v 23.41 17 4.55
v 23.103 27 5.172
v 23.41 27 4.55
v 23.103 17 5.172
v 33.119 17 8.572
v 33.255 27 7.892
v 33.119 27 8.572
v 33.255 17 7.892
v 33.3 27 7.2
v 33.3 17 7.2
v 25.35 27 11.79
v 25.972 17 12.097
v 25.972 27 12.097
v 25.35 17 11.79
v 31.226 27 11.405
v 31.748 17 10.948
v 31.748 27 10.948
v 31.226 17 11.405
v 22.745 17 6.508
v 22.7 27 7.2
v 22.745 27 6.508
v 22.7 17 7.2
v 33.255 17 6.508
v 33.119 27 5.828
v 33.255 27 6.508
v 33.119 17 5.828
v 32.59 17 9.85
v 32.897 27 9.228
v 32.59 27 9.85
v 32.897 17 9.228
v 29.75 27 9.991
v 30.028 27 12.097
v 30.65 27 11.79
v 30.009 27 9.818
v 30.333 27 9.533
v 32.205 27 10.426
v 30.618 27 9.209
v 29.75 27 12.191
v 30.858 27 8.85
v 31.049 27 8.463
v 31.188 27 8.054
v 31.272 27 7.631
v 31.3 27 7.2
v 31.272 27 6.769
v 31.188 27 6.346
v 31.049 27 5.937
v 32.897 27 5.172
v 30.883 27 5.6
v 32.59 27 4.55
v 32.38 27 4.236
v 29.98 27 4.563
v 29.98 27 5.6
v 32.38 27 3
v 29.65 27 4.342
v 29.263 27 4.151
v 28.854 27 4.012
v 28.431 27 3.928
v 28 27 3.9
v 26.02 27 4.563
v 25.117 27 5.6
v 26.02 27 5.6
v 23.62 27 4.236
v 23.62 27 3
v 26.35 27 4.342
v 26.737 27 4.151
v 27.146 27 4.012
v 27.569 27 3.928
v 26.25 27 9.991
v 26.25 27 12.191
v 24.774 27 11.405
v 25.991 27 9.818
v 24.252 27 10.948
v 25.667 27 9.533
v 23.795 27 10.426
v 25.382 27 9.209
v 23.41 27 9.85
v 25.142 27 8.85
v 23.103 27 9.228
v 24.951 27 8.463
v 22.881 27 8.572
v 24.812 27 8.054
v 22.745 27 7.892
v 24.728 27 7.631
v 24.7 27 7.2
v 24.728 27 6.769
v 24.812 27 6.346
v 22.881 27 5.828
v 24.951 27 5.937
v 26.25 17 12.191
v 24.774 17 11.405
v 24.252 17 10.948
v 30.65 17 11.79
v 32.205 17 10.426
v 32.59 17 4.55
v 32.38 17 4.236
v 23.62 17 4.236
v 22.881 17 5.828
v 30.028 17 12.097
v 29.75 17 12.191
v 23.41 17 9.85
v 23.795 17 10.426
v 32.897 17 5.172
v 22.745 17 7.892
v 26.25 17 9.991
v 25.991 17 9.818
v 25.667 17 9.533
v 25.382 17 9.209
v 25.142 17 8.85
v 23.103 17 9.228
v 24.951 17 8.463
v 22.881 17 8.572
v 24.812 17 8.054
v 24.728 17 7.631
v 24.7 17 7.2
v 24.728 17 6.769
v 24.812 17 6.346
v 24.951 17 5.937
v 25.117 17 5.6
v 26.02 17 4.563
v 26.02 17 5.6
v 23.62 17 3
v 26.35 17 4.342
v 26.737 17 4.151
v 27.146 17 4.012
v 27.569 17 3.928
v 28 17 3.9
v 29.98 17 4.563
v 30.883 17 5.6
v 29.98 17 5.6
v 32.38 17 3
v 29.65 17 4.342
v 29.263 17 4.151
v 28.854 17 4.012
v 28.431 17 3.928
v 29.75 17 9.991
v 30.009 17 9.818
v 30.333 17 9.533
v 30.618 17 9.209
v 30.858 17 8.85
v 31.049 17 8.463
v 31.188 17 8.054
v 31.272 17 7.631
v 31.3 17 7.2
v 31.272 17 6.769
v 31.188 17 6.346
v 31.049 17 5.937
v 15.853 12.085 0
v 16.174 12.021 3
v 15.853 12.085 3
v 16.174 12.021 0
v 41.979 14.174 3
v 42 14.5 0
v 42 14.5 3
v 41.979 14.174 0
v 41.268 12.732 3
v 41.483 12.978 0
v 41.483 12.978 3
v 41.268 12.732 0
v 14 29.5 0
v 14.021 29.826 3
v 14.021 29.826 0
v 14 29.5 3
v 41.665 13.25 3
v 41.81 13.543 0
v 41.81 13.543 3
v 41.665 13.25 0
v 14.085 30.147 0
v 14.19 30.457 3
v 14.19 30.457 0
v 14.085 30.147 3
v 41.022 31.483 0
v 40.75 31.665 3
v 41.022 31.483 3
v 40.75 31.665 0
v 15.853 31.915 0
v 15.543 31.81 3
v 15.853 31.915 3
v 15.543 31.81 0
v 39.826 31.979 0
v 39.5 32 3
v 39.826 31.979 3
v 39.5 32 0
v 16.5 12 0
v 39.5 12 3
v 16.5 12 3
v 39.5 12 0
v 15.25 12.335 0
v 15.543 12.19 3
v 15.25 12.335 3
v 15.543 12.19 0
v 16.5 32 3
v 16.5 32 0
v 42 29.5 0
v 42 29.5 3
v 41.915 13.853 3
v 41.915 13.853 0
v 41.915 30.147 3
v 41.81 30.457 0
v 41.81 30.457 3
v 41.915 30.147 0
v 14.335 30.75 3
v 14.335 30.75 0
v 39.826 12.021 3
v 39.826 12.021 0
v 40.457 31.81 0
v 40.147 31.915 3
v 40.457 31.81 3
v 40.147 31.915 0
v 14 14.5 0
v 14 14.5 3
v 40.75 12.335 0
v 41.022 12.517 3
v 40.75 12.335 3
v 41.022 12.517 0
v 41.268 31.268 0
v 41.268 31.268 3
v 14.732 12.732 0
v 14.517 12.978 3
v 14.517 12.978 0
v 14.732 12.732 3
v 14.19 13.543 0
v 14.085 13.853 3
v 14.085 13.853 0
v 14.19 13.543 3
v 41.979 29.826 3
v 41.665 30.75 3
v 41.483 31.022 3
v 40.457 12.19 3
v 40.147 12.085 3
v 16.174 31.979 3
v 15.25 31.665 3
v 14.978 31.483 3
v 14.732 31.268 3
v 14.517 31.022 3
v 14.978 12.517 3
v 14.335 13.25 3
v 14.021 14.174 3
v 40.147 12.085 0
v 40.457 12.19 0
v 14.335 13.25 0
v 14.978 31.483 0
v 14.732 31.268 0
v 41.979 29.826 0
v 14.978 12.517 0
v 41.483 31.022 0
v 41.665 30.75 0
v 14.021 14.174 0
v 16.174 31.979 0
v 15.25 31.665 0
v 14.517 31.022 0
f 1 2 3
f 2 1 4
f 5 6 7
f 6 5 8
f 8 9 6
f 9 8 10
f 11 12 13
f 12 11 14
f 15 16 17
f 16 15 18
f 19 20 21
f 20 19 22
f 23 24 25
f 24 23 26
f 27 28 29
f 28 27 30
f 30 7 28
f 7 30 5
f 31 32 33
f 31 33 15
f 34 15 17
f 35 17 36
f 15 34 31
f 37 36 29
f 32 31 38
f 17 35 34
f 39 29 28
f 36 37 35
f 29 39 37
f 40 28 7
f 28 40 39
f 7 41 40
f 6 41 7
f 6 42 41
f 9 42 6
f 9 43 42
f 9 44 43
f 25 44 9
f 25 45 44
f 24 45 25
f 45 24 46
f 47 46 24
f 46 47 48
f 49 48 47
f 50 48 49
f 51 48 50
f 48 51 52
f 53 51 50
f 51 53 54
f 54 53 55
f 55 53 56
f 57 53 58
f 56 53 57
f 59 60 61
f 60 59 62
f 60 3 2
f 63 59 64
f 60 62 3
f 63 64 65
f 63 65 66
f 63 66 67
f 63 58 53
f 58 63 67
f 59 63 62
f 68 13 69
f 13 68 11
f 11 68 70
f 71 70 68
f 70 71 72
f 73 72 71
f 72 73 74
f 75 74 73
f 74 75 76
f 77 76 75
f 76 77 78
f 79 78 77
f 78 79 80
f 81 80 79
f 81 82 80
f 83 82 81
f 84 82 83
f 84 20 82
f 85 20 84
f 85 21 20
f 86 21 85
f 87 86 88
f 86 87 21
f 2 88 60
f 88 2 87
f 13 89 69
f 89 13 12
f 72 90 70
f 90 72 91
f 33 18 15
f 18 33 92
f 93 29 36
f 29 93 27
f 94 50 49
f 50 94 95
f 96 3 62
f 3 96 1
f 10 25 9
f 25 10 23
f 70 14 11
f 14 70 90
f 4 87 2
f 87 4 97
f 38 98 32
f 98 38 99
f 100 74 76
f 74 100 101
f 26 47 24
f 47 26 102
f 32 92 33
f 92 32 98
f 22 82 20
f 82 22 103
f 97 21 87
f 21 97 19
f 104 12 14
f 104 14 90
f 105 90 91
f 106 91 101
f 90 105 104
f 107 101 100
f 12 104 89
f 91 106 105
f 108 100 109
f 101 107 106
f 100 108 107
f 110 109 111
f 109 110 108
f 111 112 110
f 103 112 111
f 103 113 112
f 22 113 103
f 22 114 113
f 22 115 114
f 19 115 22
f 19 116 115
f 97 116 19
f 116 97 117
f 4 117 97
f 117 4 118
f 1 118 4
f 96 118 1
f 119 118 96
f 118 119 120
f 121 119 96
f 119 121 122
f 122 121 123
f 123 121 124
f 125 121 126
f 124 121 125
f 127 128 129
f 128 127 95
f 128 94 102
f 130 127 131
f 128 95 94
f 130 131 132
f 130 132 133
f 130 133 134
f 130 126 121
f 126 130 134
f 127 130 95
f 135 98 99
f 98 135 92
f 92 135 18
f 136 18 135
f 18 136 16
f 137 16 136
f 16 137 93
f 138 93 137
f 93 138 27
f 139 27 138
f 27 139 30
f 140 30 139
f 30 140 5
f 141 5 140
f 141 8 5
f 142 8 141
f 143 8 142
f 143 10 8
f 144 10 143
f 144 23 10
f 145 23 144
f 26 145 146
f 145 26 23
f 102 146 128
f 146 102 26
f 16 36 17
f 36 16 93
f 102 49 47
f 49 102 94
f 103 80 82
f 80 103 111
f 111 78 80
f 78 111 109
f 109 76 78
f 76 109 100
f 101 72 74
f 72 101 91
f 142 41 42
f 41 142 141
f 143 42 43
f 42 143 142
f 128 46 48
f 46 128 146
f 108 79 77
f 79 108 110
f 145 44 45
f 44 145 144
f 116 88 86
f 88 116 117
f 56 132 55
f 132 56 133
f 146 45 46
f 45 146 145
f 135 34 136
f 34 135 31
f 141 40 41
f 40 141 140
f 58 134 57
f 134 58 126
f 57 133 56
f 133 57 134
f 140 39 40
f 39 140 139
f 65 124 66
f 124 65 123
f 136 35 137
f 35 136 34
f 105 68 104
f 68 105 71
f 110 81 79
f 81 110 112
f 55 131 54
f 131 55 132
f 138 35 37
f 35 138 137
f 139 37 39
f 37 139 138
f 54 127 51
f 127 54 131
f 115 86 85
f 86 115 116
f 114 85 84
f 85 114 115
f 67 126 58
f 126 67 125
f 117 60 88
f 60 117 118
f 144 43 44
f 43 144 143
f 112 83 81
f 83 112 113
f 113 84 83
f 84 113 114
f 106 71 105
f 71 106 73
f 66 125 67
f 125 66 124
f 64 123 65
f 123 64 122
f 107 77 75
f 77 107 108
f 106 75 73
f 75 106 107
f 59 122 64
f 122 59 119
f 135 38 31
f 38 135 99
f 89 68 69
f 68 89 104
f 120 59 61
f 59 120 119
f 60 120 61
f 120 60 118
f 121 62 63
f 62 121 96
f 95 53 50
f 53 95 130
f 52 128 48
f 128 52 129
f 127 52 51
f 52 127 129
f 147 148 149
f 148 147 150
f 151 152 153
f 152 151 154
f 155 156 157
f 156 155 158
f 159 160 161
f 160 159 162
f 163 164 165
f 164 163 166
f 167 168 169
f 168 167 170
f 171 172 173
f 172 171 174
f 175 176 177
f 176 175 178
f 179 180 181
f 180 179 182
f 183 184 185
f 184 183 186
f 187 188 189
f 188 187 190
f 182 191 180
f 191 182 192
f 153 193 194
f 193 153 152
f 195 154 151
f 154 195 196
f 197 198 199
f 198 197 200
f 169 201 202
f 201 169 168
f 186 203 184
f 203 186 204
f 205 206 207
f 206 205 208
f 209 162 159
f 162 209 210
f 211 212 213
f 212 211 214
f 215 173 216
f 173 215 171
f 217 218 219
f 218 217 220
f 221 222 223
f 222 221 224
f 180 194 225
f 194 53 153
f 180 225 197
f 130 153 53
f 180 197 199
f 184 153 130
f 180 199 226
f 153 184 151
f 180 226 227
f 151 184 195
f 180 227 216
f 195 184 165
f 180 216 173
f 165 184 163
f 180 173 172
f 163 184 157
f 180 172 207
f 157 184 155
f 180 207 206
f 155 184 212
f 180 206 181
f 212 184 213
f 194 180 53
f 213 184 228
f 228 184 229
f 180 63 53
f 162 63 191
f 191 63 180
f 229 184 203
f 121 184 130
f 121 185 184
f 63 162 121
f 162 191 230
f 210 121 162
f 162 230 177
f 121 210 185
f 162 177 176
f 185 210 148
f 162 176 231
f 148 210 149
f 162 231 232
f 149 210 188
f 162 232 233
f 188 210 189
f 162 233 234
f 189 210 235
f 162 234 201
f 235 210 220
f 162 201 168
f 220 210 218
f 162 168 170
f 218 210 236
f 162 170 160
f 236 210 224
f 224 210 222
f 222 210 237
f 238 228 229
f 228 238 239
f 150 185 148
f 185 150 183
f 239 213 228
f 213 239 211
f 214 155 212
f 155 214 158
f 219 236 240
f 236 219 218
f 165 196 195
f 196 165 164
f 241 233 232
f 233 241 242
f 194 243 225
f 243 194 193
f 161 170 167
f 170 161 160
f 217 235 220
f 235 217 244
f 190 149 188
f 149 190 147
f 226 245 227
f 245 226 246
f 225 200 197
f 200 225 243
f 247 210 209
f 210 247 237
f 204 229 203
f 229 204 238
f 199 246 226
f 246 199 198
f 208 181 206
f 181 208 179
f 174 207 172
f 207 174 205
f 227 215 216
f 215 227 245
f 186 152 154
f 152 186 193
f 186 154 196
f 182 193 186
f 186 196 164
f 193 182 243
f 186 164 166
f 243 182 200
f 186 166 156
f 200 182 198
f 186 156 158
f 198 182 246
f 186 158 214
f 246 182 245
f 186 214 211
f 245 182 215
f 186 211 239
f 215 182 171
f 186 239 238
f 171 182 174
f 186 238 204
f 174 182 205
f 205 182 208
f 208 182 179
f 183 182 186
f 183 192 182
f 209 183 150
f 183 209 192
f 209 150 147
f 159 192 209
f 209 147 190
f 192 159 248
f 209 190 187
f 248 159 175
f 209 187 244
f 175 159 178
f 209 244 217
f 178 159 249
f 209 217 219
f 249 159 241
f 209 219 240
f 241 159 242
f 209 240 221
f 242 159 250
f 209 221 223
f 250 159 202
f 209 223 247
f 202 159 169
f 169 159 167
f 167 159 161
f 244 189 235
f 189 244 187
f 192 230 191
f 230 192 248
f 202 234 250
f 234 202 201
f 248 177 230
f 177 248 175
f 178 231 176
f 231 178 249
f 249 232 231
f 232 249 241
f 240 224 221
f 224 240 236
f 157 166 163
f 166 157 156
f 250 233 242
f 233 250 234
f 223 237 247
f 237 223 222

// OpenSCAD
/*
Sample 114: Wiederlösbarer Kabel-Schnappclip — Kabel 6 mm
Generated from the FDM Mechanical Sample Library.
Units: millimetres.

Override examples:
  openscad -o custom.stl -D 'view="plate"' -D 'render_fn=64' model.scad
  openscad -o preview.png -D 'view="assembly"' model.scad
*/
use <../../../library/fdm_mechanisms.scad>

render_fn = is_undef(render_fn) ? 48 : render_fn;
view = is_undef(view) ? "plate" : view;
$fn = render_fn;

sample_cable_clip(
    view=view,
    cable_d=6,
    clearance=0.3,
    wall=2
);
